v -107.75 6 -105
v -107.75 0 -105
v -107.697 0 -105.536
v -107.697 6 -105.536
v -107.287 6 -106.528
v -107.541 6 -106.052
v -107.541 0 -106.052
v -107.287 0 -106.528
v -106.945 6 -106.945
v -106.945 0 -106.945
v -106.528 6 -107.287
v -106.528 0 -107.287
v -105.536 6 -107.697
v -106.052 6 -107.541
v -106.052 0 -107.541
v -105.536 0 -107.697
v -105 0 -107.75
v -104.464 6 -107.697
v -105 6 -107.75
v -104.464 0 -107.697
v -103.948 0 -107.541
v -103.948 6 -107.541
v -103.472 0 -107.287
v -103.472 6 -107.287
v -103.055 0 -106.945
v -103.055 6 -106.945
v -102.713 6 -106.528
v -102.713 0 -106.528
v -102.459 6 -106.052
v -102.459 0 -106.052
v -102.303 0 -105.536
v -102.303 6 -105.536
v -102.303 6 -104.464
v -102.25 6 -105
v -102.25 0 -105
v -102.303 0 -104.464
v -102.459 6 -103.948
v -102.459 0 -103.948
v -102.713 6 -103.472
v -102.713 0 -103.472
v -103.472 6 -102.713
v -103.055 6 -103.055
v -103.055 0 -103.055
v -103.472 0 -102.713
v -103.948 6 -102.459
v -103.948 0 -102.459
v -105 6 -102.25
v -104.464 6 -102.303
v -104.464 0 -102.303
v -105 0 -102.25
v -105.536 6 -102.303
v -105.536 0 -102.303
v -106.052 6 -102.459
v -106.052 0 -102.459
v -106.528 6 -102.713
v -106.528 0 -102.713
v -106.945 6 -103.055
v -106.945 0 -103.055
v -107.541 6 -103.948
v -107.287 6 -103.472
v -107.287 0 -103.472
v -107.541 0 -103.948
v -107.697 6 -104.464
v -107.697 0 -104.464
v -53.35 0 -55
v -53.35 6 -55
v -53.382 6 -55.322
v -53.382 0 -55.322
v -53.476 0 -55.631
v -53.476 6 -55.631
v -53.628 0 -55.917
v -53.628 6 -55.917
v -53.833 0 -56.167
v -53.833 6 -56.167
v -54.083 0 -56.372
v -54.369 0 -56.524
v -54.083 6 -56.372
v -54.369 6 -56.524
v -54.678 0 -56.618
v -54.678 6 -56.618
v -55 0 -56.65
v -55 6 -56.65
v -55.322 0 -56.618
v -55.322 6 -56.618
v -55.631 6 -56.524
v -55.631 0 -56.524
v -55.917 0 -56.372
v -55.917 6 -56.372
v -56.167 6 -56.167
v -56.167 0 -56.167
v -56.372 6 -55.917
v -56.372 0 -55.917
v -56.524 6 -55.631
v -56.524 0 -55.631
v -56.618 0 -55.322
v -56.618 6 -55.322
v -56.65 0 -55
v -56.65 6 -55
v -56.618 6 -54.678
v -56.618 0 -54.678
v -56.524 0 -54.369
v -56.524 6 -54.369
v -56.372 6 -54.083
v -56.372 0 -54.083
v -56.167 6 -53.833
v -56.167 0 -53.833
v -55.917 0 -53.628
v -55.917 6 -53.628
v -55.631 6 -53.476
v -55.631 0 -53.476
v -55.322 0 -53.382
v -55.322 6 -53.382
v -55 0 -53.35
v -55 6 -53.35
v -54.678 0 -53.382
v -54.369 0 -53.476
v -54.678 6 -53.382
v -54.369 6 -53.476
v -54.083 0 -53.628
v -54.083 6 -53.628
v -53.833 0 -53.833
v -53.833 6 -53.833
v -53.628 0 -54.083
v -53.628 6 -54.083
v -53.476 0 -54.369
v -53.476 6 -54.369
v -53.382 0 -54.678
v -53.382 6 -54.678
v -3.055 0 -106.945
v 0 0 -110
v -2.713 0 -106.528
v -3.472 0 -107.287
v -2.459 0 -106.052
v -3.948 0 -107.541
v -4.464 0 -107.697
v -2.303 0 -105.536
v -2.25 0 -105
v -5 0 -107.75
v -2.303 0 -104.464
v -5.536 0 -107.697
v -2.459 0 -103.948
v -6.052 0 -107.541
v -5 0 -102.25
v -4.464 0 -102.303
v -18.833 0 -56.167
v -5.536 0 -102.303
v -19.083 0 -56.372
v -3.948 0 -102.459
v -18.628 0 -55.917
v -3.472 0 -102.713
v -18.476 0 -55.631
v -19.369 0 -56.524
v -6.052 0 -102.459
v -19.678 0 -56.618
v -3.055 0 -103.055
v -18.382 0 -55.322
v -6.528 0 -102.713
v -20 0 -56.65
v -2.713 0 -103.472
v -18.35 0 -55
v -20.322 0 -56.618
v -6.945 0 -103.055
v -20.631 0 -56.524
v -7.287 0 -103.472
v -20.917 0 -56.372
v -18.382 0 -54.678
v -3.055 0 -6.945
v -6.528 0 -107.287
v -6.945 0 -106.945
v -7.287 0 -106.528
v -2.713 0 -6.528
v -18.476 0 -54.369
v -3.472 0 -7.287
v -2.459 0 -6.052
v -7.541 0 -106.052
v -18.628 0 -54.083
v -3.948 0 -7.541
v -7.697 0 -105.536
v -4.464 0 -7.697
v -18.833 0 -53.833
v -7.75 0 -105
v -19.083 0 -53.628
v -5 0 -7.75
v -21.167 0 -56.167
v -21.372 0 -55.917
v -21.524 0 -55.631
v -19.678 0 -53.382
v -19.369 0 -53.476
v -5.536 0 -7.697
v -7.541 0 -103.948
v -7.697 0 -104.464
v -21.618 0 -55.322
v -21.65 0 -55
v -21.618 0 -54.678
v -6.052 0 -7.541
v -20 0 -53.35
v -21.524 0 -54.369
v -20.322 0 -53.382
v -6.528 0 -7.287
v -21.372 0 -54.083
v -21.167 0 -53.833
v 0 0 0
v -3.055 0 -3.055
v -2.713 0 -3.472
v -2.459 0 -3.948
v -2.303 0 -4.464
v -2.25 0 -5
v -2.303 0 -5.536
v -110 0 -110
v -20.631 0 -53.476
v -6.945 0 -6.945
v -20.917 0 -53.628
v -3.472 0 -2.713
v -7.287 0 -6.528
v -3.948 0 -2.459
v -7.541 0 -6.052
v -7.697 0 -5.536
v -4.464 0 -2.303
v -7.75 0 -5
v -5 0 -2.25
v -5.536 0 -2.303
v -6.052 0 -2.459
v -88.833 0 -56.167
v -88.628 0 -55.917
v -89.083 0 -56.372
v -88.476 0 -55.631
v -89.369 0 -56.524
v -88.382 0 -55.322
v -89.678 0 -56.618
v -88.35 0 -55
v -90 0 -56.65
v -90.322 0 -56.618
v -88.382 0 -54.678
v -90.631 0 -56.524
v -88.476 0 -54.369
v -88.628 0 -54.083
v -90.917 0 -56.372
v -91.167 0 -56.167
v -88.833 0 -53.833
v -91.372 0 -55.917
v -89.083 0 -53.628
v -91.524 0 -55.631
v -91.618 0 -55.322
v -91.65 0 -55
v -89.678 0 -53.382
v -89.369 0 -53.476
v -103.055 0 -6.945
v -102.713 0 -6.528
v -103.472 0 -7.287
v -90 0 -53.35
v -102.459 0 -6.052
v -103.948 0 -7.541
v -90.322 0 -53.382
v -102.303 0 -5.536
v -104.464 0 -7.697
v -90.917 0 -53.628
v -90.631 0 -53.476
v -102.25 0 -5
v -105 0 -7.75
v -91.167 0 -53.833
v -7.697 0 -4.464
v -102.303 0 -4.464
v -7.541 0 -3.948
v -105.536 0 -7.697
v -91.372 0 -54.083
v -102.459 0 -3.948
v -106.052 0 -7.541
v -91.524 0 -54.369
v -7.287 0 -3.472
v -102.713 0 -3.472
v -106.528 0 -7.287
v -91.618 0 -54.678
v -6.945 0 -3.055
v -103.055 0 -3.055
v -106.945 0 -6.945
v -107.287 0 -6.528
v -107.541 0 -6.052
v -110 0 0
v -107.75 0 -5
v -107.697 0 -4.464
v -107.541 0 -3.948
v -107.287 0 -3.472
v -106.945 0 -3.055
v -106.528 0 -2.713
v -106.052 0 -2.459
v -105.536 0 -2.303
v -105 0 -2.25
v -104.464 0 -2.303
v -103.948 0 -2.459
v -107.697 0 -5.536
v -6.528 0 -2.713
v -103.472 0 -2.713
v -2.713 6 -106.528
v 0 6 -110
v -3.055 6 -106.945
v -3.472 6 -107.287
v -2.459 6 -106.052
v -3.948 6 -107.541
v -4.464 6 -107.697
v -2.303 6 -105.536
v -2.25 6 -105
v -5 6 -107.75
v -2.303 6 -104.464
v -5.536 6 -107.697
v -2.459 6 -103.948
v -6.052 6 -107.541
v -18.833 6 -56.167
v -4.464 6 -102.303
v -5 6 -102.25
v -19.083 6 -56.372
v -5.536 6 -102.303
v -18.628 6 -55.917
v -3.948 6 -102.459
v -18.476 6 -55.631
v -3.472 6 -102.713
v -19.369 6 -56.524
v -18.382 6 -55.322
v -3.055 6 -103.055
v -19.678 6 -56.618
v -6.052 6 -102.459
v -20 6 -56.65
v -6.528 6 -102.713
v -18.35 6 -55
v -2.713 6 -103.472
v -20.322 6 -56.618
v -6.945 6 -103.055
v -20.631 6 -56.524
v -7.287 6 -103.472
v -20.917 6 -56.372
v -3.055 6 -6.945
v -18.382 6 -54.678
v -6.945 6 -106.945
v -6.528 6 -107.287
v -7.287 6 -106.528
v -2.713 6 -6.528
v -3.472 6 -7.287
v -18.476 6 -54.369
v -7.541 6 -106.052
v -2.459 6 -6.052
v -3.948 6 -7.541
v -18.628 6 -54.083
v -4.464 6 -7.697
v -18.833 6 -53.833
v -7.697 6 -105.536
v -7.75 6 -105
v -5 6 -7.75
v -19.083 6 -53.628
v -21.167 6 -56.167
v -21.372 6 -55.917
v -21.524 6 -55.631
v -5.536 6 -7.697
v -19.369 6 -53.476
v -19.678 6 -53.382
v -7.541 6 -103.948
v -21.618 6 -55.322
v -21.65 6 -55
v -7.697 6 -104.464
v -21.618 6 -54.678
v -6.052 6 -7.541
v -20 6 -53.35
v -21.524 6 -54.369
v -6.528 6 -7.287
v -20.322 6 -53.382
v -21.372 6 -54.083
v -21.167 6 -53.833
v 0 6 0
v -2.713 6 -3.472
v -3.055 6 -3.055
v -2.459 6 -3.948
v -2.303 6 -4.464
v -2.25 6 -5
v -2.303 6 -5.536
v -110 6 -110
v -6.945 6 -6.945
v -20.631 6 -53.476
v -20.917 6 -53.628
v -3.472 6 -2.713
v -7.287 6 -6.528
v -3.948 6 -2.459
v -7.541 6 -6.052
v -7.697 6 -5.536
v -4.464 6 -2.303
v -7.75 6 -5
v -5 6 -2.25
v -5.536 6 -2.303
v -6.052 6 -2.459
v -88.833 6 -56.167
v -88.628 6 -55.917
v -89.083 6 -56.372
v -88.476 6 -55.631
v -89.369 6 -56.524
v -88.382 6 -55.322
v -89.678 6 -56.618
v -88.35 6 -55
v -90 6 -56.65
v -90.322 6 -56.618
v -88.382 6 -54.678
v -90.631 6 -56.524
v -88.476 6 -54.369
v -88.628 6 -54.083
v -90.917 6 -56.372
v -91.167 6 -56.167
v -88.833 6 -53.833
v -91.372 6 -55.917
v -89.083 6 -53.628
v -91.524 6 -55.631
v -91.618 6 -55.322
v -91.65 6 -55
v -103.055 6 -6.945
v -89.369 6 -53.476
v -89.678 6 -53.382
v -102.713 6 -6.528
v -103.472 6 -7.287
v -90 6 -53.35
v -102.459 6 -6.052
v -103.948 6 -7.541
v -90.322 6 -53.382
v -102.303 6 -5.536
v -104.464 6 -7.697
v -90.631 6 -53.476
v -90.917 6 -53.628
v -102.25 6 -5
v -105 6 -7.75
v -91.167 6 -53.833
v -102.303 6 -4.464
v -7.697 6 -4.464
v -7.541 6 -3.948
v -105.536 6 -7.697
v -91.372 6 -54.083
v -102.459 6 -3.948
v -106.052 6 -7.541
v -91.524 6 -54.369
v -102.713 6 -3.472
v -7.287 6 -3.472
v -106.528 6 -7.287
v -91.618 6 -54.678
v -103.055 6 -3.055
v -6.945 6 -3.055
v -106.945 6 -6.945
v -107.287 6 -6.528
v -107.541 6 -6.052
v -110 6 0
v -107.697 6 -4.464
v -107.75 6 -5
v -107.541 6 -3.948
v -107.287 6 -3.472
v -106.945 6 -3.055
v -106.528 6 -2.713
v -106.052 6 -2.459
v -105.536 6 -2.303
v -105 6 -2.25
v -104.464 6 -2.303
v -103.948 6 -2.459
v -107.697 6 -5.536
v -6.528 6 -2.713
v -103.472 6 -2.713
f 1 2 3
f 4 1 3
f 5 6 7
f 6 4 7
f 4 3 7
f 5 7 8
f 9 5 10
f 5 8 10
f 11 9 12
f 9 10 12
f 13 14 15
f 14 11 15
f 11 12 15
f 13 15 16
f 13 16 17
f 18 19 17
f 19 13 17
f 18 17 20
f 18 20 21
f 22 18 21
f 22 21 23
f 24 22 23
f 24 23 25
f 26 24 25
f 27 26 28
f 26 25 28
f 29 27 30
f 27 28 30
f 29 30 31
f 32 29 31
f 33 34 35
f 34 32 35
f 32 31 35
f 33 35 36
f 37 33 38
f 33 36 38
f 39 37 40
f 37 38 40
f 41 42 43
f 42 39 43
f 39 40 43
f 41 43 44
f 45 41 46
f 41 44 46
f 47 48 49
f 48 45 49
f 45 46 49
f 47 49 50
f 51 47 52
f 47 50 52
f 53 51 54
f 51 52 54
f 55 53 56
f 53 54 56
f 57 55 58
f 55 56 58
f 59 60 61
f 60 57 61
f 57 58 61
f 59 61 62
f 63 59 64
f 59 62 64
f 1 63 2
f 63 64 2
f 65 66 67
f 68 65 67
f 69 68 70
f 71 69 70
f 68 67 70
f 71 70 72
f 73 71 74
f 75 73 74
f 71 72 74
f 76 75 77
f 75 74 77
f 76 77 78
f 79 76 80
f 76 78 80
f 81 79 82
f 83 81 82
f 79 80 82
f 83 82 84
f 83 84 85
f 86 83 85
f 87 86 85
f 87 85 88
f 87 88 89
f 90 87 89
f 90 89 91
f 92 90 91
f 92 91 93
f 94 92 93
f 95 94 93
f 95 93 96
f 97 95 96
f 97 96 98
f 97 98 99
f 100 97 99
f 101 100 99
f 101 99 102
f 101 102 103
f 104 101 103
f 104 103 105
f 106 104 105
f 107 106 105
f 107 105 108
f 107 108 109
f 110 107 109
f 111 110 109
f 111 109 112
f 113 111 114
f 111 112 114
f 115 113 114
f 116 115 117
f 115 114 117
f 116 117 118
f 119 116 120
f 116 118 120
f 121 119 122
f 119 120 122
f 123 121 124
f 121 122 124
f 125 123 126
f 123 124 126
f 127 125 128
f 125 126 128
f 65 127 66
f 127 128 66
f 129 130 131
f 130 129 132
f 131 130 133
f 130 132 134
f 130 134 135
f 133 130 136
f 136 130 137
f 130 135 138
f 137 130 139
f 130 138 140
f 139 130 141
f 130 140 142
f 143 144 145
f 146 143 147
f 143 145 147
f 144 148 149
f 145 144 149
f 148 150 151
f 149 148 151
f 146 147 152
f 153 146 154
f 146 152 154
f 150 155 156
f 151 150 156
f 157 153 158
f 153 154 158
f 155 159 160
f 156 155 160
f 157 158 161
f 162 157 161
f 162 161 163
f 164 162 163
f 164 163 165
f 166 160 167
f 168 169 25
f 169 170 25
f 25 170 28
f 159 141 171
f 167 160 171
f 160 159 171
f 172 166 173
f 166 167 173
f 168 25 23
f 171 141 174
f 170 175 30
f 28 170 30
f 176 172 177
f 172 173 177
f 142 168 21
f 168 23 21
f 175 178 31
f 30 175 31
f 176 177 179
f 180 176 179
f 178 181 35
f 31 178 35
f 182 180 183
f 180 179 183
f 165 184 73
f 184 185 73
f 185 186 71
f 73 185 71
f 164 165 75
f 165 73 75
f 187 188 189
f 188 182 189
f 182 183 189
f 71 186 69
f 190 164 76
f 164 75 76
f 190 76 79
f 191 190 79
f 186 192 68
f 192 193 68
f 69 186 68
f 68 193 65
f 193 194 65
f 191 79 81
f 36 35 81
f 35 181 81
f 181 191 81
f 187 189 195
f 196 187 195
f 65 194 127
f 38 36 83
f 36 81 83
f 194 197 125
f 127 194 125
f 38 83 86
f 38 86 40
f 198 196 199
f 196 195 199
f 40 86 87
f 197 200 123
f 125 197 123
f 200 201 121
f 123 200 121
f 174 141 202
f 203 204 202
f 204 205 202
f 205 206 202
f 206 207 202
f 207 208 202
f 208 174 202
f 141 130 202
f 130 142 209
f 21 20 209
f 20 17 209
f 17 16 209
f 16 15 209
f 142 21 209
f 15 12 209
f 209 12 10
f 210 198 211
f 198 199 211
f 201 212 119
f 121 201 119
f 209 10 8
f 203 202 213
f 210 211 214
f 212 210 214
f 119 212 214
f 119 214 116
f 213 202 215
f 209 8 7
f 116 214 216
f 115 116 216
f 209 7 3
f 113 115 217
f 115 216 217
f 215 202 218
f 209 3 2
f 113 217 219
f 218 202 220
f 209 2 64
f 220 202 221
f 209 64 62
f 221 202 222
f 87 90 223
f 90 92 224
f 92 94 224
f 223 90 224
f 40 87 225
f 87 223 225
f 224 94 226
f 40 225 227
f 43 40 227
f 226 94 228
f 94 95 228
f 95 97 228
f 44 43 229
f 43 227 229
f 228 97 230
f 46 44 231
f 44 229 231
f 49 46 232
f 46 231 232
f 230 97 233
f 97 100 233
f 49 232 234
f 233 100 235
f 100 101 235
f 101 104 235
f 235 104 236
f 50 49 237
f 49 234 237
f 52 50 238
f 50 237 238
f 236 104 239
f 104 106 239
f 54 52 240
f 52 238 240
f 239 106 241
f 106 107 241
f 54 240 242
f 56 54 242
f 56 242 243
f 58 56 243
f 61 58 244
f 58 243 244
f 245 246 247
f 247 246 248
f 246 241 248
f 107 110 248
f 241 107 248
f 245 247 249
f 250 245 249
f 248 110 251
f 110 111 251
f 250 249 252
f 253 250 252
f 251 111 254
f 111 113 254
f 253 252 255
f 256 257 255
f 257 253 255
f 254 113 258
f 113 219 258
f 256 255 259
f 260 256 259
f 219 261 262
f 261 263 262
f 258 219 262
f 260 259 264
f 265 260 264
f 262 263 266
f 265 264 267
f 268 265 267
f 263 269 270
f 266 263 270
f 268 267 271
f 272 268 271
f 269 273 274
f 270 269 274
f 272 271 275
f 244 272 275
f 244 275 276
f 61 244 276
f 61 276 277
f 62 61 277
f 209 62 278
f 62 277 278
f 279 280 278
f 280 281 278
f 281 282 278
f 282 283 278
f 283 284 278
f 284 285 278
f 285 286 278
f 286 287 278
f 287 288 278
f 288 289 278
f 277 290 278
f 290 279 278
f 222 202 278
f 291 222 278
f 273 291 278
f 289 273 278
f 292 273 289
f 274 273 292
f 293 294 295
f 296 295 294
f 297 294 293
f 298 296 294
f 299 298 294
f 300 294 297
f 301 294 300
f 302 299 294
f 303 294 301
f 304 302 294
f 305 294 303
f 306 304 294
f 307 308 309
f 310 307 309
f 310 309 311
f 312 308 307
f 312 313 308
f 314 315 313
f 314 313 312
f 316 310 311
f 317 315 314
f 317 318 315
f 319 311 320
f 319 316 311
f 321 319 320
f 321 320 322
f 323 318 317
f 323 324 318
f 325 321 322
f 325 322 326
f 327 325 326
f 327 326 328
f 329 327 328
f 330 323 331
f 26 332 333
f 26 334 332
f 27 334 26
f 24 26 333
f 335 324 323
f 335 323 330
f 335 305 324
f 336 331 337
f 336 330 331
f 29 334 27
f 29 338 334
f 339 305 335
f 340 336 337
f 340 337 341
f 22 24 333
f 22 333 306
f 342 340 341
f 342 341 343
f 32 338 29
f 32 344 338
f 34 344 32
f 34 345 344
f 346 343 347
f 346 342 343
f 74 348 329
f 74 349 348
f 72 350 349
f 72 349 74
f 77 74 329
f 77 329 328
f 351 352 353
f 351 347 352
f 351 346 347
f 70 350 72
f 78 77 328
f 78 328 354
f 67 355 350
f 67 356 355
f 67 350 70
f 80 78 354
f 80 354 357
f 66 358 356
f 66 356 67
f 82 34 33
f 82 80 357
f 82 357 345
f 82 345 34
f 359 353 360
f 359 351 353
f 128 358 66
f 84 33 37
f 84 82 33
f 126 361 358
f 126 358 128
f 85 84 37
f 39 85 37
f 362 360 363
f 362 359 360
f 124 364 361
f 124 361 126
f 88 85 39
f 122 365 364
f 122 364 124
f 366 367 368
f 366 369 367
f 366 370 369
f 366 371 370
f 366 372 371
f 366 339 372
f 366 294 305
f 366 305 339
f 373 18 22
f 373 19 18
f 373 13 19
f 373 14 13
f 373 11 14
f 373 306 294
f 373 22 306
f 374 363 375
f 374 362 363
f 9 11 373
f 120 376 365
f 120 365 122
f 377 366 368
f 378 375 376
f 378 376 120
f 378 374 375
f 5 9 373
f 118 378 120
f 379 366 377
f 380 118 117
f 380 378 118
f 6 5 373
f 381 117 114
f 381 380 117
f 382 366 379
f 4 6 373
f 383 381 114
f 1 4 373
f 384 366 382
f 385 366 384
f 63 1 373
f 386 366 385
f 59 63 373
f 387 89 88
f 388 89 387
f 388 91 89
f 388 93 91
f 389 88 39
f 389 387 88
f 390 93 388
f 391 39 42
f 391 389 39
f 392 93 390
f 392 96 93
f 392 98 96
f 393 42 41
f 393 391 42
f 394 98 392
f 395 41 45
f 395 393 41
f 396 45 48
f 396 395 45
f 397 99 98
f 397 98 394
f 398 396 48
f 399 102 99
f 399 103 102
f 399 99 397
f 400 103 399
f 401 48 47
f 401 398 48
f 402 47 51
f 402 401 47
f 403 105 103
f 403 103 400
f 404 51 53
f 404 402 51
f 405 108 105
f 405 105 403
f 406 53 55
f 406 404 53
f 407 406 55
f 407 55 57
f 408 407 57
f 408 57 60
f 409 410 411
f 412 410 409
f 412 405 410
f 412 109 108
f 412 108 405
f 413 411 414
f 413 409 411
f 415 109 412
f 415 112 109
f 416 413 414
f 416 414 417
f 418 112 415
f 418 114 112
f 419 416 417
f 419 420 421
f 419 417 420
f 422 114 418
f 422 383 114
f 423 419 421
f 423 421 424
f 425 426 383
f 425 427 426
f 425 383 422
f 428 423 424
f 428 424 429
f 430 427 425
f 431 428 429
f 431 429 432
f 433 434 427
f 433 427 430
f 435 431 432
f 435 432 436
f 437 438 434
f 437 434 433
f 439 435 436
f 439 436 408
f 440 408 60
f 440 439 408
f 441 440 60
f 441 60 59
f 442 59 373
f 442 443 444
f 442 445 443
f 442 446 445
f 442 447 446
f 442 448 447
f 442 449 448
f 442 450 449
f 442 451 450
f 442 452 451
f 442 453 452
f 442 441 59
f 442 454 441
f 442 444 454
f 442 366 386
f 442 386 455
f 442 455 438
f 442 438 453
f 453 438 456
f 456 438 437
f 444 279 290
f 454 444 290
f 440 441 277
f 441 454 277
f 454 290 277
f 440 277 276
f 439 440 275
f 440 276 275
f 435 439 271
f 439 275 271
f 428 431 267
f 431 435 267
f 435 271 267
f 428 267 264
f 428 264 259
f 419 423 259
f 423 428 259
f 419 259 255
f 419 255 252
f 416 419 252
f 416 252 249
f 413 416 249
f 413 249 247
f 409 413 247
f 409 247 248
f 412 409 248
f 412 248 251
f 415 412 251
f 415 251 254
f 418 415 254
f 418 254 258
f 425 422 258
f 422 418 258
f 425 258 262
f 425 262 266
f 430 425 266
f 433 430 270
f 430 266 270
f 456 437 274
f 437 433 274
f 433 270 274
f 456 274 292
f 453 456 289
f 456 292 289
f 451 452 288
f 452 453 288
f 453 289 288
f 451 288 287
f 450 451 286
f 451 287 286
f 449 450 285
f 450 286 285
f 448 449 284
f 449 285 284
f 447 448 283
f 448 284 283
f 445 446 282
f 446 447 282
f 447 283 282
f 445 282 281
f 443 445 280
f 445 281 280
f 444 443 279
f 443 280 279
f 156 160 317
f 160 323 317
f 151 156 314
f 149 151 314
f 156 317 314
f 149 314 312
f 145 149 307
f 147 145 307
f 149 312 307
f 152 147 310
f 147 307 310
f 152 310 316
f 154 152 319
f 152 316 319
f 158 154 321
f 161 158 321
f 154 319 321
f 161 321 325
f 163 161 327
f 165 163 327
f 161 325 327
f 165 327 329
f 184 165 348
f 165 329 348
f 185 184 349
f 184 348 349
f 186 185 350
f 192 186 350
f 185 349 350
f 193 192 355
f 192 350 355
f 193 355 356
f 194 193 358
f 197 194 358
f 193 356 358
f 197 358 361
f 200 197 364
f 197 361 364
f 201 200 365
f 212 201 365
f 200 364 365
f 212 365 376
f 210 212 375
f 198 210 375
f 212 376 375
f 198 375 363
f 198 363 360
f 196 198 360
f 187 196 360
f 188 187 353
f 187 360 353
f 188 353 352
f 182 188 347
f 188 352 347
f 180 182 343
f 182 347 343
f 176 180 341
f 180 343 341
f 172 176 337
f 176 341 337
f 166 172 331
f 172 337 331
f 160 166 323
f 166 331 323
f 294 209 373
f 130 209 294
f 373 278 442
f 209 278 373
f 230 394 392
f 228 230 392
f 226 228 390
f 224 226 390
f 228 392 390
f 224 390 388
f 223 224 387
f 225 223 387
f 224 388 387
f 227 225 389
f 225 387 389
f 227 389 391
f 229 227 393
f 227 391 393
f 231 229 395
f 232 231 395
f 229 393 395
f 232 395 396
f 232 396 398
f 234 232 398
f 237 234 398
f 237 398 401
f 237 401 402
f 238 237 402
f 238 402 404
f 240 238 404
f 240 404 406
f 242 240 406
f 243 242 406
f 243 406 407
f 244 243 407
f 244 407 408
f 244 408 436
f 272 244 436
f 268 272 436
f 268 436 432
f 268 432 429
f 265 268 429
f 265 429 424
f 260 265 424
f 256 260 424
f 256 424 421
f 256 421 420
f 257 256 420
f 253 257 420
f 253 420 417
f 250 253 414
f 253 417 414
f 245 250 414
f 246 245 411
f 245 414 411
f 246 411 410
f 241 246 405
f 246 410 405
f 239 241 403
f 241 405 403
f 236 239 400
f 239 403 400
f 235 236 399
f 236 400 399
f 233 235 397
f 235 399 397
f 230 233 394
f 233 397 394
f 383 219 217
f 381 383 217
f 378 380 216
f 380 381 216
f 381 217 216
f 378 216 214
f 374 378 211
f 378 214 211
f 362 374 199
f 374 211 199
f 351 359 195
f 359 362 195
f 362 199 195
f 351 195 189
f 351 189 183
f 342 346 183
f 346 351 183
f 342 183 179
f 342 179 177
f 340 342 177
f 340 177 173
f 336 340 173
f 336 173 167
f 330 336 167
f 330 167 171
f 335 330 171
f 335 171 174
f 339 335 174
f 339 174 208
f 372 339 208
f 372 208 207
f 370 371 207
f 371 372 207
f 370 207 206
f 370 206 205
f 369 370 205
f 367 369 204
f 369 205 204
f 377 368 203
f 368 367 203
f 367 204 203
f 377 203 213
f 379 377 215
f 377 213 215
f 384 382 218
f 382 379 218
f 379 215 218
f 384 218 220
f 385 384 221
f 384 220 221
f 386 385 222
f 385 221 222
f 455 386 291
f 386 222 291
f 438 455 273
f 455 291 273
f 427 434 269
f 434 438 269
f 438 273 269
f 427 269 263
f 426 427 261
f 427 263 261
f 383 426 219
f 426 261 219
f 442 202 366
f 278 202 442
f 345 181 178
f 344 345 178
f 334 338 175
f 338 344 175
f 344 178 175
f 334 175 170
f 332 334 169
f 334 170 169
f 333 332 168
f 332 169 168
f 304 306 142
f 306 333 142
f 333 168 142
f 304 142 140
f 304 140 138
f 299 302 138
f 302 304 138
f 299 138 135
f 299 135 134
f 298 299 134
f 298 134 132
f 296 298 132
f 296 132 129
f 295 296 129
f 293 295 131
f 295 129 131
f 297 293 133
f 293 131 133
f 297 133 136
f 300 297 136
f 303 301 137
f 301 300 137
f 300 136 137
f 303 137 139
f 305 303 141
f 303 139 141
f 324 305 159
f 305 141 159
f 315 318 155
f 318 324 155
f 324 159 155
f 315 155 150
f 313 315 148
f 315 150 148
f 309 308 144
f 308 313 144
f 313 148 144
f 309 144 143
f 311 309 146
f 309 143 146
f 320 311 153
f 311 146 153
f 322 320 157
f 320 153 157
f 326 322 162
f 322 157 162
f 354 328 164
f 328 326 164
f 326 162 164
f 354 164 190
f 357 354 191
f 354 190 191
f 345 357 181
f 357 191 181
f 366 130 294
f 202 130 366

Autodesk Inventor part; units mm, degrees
ref_plane "YZ Plane" through (0, 0, 0) normal (1, 0, 0) x (0, 1, 0)
ref_plane "XZ Plane" through (0, 0, 0) normal (0, 1, 0) x (-1, 0, 0)
ref_plane "XY Plane" through (0, 0, 0) normal (0, 0, 1) x (1, 0, 0)
sketch "Sketch1" plane through (0, 0, 0) normal (0, 1, 0) x (-1, 0, 0)
  line L0 (0, 0) -> (110, 0)
  line L1 (110, 0) -> (110, -110)
  line L2 (110, -110) -> (0, -110)
  line L3 (0, -110) -> (0, 0)
  circle A0 centre (5, -5) radius 2.75
  line L4 (55, 0) -> (55, -110) construction
  line L5 (0, -55) -> (110, -55) construction
  circle A1 centre (5, -105) radius 2.75
  circle A2 centre (105, -5) radius 2.75
  circle A3 centre (105, -105) radius 2.75
  dimension "d0" = 110
  dimension "d1" = 110
  dimension "d2" = 5.5
  dimension "d5" = 100
  dimension "d8" = 100
  dimension "d11" = 5
  dimension "d12" = 5
extrude "Extrusion1" add sketch "Sketch1" along normal blind 6
sketch "Sketch2" plane through (0, 6, 0) normal (0, 1, 0) x (1, 0, 0)
  line L0 (0, 0) -> (0, 110) construction
  line L1 (0, 55) -> (-110, 55) construction
  line L2 (-110, 110) -> (-110, 0) construction
  line L3 (-110, 0) -> (0, 0) construction
  line L4 (-55, 0) -> (-55, 110) construction
  line L5 (0, 110) -> (-110, 110) construction
  circle A0 centre (-20, 55) radius 1.65
  circle A1 centre (-55, 55) radius 1.65
  circle A2 centre (-90, 55) radius 1.65
  point P0 (-110, 7.25)
  point P1 (-2.25, 110)
  dimension "d18" = 3.3
  dimension "d22" = 20
  dimension "d36" = 35
extrude "Extrusion2" cut sketch "Sketch2" against normal blind 6
thread "Thread1" size "M4x0.7" class "6H" standard "ANSI Metric M Profile" full length
thread "Thread2" size "M3.5x0.6" class "6H" standard "ANSI Metric M Profile" full length
thread "Thread3" size "M3.5x0.6" class "6H" standard "ANSI Metric M Profile" full length
properties part number "Deska izolovaná" material "PC/ABS Plastic"
